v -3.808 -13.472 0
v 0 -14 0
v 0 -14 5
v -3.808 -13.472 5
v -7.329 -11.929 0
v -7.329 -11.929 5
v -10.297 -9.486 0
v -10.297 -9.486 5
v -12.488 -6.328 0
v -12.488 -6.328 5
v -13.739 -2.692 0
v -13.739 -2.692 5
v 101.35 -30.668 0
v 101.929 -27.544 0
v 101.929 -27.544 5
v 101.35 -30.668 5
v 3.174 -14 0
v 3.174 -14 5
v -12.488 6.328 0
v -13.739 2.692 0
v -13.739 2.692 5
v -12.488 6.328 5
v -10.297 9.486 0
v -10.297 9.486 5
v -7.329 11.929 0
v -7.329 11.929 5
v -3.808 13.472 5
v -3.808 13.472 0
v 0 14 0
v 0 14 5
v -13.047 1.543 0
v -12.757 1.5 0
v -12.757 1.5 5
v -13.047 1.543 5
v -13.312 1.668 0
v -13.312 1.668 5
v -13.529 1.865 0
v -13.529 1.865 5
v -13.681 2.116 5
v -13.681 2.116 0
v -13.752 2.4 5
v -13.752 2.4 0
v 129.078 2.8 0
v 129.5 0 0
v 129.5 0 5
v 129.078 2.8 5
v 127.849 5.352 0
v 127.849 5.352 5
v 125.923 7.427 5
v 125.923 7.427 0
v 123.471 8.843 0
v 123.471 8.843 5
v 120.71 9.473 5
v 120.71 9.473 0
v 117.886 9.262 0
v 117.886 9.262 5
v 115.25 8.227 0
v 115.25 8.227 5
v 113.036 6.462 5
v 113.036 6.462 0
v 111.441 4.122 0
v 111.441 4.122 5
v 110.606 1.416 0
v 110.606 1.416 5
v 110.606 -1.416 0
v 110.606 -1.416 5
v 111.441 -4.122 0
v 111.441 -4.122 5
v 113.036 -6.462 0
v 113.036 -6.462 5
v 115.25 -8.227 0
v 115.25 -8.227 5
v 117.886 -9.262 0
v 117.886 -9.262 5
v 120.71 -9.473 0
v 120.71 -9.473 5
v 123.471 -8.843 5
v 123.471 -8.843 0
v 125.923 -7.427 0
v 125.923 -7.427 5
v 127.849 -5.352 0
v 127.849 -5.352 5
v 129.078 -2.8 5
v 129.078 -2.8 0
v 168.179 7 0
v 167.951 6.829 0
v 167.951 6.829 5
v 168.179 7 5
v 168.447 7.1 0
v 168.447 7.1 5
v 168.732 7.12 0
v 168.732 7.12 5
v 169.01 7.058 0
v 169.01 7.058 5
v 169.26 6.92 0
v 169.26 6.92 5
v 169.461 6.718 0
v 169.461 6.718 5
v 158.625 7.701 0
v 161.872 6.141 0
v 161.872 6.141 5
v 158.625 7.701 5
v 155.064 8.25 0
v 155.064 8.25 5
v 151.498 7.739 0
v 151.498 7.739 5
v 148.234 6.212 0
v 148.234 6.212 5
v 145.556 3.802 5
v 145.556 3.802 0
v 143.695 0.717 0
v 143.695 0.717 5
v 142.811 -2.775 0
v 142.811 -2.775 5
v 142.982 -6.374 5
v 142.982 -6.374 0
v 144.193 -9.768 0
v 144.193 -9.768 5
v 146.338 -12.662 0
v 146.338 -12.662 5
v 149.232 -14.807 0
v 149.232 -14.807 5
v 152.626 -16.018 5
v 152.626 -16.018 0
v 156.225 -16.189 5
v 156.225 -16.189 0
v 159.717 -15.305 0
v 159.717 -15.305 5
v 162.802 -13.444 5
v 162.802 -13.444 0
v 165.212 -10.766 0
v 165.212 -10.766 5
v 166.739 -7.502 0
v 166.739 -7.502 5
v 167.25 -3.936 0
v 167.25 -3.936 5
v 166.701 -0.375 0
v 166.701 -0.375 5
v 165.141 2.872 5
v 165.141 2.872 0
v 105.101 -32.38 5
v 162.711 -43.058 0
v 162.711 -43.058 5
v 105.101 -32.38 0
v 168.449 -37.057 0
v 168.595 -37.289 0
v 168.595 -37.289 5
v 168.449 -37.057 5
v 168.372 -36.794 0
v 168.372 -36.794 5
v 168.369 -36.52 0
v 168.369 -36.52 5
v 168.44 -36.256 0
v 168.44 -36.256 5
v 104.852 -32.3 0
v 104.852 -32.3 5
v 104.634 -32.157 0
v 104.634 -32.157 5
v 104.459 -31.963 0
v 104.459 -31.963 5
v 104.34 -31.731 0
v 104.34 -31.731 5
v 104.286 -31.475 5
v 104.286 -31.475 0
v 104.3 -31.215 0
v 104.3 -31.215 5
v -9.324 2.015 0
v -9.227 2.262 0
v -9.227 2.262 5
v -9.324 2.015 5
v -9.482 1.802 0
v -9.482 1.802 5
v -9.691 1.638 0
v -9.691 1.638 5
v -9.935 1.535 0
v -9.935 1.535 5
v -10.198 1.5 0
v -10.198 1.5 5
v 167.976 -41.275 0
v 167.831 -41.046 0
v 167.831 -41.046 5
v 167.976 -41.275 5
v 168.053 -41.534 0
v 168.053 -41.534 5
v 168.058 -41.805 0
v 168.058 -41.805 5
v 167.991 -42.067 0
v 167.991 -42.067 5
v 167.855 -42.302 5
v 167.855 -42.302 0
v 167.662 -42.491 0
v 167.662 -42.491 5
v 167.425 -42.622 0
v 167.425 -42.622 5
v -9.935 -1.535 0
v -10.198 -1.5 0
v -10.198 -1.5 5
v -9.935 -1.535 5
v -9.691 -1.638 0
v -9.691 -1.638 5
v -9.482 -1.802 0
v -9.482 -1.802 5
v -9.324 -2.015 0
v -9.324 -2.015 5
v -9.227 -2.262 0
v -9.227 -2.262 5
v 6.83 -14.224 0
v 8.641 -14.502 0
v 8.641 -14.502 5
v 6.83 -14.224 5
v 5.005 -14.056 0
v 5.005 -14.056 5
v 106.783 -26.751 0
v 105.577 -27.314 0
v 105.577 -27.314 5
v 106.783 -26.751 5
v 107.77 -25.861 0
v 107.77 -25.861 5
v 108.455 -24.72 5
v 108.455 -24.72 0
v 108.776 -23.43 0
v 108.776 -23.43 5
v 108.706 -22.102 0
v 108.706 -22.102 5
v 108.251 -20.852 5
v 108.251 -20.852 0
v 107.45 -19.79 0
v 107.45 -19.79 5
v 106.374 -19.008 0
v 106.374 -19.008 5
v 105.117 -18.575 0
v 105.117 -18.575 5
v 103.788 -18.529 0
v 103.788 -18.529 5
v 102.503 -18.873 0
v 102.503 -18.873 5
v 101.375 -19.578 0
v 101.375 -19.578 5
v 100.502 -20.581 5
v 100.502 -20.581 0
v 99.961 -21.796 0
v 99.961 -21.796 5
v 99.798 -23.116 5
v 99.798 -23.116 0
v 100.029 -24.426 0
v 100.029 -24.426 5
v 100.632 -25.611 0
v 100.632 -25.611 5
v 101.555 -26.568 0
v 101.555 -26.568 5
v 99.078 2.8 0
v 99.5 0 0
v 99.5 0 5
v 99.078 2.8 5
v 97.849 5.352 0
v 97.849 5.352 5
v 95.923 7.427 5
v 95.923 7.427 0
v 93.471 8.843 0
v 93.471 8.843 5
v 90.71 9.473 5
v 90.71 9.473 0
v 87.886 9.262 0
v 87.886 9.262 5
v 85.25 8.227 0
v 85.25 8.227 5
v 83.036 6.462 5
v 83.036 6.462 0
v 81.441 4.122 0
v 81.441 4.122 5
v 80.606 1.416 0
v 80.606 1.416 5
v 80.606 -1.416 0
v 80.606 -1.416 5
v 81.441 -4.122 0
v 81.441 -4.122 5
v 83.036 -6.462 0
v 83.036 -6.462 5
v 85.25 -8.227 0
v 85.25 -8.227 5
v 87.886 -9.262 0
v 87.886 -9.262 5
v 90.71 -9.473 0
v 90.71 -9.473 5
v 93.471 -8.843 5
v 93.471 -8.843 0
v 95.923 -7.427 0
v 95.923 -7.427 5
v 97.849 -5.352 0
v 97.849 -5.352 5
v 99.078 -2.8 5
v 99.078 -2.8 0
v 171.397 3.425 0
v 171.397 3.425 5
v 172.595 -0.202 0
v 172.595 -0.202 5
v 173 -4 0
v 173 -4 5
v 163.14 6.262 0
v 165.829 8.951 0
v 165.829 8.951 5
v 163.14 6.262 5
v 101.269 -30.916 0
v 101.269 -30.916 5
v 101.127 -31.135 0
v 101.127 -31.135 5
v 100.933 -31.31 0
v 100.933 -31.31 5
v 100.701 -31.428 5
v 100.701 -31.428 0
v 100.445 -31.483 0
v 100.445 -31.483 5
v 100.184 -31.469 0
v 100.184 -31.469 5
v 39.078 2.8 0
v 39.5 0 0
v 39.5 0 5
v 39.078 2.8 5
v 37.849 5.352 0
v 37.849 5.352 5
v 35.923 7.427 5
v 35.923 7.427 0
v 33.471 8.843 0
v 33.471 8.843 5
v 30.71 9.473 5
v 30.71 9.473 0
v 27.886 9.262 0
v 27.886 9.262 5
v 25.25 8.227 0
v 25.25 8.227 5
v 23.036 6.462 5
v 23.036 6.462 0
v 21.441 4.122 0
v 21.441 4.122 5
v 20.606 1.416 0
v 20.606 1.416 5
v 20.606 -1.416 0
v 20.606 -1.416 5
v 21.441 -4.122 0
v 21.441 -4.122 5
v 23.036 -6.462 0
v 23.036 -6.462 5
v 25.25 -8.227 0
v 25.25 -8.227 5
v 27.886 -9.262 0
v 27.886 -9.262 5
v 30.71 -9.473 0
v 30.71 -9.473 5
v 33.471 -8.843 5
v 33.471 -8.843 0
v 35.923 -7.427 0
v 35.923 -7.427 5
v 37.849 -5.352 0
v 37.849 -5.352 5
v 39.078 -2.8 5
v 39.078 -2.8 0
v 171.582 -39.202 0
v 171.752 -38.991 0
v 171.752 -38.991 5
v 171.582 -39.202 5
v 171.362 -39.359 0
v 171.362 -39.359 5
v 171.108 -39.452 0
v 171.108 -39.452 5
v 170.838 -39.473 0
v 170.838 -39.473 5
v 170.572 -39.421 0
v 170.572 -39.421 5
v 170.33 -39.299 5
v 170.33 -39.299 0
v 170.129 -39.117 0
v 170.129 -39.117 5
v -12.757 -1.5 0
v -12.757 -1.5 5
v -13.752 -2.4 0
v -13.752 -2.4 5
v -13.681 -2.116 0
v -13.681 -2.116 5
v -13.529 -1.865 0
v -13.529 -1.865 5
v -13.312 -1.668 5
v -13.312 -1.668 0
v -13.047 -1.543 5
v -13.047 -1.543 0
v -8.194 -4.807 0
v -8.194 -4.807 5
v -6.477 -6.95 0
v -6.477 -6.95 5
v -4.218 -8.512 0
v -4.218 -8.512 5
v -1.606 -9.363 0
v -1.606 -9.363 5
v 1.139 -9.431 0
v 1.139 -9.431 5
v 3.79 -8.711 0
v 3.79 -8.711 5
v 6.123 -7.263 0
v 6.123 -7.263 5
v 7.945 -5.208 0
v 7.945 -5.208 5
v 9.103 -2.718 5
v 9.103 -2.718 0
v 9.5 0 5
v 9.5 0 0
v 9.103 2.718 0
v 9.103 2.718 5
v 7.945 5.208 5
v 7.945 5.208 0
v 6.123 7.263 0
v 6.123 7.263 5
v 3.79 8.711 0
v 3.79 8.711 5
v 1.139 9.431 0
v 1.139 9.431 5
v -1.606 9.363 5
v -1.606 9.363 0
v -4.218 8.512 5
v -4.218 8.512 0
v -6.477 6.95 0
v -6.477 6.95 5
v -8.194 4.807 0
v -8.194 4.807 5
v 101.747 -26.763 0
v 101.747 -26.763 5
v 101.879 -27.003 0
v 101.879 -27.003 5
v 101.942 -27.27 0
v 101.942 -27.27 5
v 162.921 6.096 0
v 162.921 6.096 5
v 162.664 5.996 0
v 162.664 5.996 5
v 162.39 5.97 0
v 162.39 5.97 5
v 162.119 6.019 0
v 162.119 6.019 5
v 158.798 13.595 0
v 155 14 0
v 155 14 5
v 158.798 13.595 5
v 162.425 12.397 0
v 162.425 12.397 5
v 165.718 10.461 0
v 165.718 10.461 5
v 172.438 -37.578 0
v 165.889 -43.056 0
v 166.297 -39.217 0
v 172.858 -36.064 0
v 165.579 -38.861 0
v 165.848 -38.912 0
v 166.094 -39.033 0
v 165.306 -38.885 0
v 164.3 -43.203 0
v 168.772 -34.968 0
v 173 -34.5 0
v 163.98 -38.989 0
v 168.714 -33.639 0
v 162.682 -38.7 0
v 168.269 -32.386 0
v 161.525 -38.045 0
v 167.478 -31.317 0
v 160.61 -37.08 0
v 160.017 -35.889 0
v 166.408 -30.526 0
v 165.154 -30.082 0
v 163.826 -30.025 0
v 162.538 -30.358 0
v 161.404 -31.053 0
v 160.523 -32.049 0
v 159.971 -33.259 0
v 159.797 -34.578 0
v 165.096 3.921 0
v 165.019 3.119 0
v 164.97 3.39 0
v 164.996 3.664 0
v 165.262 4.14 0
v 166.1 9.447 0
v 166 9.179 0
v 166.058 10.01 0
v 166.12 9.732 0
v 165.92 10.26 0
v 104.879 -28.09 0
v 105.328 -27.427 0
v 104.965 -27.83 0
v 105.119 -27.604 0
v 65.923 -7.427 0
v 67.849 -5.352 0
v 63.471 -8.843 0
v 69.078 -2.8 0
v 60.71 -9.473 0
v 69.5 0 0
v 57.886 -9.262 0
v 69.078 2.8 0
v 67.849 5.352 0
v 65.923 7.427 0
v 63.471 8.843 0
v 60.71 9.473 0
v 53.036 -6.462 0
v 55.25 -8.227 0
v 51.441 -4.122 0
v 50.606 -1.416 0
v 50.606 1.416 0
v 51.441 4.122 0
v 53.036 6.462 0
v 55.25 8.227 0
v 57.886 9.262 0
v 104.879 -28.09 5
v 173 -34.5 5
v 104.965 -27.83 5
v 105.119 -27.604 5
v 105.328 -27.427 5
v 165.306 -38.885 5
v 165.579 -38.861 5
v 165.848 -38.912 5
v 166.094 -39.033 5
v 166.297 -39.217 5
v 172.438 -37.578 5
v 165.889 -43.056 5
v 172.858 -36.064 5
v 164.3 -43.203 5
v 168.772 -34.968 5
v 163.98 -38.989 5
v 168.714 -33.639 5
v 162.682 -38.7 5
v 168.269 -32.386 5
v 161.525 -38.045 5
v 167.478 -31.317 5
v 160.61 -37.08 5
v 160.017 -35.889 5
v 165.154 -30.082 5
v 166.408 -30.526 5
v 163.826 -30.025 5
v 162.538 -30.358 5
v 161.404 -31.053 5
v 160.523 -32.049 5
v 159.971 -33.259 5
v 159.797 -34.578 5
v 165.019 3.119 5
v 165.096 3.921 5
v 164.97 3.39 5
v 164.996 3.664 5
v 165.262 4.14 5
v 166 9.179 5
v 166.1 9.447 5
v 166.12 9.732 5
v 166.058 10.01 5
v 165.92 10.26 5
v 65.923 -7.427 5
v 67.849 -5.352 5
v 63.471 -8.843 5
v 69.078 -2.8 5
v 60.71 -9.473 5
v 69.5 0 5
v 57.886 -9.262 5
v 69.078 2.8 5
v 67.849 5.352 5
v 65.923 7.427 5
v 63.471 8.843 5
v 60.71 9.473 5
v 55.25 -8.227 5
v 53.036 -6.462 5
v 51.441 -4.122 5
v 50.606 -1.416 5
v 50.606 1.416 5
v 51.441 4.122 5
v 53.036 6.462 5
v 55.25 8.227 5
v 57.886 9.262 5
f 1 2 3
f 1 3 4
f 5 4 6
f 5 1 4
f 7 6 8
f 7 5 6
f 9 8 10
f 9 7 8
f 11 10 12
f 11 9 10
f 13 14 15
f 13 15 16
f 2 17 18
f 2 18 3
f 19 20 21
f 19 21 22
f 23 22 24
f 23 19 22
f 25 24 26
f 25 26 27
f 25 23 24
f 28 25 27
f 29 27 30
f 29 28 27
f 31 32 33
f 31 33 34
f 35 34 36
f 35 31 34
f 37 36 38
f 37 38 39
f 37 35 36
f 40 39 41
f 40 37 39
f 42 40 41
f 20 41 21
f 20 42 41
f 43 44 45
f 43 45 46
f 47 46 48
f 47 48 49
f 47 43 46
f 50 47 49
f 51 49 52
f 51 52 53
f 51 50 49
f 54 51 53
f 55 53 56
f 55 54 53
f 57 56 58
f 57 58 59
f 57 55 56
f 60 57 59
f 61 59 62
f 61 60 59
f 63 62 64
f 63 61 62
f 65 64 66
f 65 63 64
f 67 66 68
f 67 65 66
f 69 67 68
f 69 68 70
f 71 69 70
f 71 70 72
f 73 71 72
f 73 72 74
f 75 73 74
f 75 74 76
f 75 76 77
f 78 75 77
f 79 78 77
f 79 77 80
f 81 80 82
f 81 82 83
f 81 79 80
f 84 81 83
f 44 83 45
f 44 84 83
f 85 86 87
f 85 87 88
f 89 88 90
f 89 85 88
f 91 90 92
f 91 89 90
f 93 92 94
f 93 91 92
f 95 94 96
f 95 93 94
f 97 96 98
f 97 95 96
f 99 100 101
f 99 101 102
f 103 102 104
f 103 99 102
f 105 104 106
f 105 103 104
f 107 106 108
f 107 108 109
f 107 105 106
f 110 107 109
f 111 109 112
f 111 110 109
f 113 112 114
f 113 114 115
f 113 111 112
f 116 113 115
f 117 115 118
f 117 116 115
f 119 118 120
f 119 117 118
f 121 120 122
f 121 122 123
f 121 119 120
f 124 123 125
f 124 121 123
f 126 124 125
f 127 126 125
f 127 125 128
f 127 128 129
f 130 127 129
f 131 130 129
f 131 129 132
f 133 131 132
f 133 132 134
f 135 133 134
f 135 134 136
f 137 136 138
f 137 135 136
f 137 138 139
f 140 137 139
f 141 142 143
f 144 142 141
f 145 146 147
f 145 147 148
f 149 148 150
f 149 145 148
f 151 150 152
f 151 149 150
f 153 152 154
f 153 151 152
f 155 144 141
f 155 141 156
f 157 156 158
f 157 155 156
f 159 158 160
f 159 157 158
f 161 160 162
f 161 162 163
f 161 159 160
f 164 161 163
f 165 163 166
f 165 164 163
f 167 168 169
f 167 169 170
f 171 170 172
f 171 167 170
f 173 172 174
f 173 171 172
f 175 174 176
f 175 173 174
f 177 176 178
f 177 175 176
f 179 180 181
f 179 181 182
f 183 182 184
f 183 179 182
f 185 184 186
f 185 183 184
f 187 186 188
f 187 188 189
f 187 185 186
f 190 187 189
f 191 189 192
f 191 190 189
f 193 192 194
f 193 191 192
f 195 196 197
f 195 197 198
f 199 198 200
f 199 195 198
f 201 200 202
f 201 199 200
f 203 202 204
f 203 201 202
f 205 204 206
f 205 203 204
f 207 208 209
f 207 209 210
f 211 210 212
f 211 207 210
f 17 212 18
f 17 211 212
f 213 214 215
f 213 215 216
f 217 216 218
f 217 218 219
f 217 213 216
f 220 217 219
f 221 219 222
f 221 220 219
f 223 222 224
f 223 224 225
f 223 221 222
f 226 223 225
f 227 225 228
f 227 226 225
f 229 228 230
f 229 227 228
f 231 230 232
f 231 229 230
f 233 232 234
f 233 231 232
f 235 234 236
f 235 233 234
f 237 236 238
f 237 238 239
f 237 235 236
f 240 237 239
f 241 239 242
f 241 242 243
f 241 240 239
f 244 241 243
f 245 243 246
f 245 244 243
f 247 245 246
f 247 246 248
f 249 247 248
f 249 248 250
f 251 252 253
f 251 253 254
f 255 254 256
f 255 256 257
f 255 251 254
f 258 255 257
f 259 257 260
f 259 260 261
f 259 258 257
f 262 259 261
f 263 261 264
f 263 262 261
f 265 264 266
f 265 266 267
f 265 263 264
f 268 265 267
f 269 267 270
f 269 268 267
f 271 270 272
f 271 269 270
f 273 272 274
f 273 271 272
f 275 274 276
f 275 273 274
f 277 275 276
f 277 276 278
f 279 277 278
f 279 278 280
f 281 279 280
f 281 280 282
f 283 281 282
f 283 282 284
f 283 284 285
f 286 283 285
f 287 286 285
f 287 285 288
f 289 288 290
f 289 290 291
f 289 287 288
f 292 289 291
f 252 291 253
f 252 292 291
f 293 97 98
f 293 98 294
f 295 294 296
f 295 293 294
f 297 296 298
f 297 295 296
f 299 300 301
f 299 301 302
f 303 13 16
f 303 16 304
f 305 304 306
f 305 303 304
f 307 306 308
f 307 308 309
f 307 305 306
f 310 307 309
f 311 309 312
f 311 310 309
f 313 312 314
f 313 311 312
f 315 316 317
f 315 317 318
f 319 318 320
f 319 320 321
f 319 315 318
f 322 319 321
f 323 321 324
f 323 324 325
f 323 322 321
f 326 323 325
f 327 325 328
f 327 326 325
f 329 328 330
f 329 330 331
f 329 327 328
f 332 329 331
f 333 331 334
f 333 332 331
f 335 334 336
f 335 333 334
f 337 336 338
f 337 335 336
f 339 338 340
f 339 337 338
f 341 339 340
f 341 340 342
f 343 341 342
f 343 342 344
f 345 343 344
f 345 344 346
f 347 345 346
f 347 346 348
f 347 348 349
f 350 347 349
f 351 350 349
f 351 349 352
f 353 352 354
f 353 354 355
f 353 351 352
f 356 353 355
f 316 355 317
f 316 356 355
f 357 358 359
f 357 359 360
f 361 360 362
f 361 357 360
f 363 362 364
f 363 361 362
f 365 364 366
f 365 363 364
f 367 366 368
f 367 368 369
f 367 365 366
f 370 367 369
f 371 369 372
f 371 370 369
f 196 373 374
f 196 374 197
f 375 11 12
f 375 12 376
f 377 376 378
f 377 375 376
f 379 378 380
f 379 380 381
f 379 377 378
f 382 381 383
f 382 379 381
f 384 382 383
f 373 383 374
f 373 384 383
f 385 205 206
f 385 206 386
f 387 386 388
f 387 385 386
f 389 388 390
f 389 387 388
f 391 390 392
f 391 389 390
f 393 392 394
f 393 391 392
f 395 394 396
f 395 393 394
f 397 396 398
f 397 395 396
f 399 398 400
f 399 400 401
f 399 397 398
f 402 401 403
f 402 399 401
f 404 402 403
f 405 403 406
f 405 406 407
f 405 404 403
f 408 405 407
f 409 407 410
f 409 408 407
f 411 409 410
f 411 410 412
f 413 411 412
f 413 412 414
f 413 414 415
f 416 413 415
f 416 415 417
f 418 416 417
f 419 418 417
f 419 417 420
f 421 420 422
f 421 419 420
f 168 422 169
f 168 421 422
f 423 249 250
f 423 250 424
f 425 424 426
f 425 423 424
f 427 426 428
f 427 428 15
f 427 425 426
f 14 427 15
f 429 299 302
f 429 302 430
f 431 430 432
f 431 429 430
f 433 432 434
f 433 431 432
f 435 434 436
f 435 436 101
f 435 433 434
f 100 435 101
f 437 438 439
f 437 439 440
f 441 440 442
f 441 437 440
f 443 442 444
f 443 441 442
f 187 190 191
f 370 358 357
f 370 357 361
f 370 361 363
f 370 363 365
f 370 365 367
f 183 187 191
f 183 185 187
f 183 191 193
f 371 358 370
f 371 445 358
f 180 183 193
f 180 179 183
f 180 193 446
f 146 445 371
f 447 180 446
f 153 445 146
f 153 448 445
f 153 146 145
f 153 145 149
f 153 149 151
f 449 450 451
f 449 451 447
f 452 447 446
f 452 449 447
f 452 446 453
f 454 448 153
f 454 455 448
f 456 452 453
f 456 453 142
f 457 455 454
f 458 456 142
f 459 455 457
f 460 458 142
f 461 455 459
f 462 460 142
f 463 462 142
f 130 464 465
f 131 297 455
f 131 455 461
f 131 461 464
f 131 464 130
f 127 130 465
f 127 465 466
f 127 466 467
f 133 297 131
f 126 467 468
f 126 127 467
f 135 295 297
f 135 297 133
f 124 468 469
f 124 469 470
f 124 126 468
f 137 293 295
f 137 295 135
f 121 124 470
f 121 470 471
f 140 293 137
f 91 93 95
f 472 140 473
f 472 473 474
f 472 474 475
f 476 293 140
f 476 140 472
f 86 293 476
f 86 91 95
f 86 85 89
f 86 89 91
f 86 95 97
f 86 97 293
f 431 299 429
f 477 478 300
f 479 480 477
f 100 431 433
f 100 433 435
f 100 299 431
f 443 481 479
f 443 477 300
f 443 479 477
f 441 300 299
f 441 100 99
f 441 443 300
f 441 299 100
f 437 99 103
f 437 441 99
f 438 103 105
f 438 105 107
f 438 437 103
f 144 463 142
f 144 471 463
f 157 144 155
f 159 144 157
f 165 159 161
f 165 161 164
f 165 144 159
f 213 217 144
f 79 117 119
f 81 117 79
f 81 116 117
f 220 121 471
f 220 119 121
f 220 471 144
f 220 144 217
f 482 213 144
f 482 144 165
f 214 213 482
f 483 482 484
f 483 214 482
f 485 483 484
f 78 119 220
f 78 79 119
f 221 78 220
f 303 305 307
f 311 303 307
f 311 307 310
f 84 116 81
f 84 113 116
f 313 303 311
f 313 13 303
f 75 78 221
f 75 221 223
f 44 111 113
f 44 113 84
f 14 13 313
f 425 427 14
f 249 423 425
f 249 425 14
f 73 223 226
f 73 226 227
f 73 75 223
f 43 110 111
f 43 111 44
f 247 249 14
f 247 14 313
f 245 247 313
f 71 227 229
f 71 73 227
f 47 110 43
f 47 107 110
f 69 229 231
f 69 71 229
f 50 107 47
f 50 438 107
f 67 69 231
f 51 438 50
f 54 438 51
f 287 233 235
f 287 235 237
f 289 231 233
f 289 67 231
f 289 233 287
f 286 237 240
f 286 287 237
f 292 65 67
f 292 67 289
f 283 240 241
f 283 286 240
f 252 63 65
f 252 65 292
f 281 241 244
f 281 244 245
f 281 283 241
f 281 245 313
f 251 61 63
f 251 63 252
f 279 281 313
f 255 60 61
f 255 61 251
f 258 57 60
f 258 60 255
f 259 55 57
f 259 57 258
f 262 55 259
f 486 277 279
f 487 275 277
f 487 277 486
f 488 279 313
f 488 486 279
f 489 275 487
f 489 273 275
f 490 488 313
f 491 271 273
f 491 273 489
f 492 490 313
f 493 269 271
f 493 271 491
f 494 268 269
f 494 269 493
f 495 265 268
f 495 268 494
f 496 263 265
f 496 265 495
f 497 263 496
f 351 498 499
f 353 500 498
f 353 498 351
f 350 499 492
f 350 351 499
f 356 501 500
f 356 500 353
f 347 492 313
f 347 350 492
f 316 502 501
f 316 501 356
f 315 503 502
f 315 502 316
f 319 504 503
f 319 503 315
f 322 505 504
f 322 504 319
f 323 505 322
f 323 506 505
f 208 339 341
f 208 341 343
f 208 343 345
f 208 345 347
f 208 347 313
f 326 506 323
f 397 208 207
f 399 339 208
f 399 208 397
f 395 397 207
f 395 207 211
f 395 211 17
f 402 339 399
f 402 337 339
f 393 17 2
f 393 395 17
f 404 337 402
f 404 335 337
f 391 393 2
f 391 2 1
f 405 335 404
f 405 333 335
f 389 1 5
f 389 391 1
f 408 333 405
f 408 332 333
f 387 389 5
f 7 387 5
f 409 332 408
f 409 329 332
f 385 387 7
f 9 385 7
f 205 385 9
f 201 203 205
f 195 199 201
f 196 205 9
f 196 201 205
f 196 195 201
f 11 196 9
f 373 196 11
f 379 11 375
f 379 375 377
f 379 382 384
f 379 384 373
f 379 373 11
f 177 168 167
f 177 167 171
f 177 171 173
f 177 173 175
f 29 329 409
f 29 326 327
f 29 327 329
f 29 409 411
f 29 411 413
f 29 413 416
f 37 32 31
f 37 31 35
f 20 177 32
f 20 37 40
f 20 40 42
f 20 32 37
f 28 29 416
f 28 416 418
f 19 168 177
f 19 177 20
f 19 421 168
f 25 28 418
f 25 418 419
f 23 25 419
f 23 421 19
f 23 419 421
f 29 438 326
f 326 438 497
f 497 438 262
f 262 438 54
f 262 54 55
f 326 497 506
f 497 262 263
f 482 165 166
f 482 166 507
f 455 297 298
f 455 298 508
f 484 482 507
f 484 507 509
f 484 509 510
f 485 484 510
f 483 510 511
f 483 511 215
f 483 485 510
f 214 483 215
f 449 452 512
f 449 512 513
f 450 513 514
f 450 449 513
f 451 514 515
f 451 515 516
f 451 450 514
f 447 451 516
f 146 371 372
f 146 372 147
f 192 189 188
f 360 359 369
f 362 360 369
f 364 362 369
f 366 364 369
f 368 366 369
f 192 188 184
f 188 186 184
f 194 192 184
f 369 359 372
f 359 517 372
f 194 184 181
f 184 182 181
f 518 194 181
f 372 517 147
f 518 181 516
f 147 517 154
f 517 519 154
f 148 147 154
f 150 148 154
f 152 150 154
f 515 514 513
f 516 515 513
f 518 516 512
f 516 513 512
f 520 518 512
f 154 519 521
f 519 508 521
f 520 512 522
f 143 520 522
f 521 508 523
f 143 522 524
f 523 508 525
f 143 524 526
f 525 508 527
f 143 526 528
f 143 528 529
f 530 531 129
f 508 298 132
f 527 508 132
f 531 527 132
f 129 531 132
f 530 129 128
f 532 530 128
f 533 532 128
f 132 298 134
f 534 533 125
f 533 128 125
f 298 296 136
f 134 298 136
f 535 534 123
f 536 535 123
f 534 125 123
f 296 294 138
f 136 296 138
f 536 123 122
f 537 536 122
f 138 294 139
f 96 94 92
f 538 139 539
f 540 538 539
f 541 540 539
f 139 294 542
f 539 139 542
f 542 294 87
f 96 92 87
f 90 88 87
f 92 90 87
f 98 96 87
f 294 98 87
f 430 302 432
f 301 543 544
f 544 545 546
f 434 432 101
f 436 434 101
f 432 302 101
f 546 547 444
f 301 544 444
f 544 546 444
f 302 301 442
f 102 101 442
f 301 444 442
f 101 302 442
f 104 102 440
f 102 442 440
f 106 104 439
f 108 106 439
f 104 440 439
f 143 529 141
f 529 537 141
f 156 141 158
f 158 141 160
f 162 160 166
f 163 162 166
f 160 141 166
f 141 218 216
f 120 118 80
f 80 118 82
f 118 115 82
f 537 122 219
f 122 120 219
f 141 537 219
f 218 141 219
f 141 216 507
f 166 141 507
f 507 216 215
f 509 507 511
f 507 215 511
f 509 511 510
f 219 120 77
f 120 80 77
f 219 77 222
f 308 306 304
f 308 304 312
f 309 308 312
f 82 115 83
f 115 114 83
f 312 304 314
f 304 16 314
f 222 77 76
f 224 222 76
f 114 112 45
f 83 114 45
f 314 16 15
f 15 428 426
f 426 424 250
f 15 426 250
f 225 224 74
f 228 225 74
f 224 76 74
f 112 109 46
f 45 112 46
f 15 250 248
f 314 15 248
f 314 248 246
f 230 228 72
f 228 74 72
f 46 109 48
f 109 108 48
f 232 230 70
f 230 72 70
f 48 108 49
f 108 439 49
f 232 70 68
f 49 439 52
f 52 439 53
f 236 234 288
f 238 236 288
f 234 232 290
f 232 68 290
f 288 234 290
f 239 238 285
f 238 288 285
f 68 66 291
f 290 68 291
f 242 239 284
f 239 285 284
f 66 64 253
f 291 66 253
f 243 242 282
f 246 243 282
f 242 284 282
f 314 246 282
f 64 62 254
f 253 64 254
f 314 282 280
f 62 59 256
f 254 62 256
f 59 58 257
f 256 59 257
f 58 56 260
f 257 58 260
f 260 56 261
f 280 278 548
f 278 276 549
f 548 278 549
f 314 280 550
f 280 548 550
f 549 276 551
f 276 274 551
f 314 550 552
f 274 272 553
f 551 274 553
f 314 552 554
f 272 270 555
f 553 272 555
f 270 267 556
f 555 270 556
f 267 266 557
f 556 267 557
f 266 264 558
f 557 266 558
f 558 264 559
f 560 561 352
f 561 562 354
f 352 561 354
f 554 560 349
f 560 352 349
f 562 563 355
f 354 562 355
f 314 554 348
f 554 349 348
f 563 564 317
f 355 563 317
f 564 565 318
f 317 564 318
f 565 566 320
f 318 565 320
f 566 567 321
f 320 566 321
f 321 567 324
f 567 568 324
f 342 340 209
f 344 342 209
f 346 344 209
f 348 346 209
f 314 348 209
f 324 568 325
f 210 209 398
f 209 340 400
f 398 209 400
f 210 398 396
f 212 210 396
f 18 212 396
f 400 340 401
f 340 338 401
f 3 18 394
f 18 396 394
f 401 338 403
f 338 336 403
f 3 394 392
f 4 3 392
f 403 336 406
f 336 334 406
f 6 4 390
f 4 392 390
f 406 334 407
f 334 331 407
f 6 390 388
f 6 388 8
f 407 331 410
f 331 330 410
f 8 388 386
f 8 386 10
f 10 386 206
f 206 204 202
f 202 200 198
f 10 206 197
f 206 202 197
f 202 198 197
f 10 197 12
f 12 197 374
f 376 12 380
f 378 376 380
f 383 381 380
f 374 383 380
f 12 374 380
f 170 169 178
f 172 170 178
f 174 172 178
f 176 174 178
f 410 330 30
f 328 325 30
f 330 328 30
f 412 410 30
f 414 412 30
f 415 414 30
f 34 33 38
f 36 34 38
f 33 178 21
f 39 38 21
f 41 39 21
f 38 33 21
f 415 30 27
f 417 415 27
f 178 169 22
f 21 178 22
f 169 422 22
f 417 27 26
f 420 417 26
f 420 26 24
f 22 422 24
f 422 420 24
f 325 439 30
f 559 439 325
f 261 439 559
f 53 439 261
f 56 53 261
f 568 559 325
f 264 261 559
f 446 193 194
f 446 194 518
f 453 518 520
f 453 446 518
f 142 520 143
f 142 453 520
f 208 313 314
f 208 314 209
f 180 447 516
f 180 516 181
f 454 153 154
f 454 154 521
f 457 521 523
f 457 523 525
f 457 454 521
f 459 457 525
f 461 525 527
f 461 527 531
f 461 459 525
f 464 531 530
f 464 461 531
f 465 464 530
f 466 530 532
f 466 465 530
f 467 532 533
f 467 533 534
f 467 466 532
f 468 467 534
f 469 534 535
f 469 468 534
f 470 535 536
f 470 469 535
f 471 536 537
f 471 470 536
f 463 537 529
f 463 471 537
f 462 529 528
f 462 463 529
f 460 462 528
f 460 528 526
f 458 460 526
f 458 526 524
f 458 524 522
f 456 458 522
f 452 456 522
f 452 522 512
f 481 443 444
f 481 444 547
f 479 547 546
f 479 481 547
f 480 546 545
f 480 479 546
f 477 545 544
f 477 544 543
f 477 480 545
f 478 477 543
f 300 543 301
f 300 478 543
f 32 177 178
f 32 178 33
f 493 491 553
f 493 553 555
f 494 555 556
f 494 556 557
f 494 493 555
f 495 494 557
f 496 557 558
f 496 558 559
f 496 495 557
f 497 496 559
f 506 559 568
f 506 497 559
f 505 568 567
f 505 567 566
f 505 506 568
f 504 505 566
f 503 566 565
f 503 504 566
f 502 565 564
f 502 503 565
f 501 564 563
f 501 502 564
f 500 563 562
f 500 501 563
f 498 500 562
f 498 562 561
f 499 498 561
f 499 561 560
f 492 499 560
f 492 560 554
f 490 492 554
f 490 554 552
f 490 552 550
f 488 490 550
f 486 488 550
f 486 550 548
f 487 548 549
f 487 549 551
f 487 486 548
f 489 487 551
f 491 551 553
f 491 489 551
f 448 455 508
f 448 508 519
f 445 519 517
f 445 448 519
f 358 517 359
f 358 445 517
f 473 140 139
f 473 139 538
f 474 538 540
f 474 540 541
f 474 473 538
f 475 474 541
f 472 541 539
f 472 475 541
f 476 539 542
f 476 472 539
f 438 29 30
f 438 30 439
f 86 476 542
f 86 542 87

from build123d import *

# Parameters (mm, degrees)
SKETCH1_R      = 9.5
EXTRUDE1_DEPTH = 5


with BuildPart() as part:
    # Sketch1 → Extrude1 (new body)
    with BuildSketch(Plane.XY):
        with BuildLine():
            Line((0, 14), (155, 14))
            ThreePointArc((155, 14), (160.643434486, 13.092444155), (165.717787645, 10.461294133))
            ThreePointArc((165.717787645, 10.461294133), (166.119633231, 9.731618991), (165.829461779, 8.950782122))
            Line((165.829461779, 8.950782122), (163.140222938, 6.261543282))
            ThreePointArc((163.140222938, 6.261543282), (162.527882268, 5.973150498), (161.872126258, 6.140827417))
            ThreePointArc((161.872126258, 6.140827417), (146.33794193, -12.66205807), (165.140827417, 2.872126258))
            ThreePointArc((165.140827417, 2.872126258), (164.973150498, 3.527882268), (165.261543282, 4.140222938))
            Line((165.261543282, 4.140222938), (167.950782122, 6.829461779))
            ThreePointArc((167.950782122, 6.829461779), (168.731618991, 7.119633231), (169.461294133, 6.717787645))
            ThreePointArc((169.461294133, 6.717787645), (172.092444155, 1.643434486), (173, -4))
            Line((173, -4), (173, -34.5))
            ThreePointArc((173, -34.5), (172.682195303, -36.830428123), (171.751990775, -38.990662972))
            ThreePointArc((171.751990775, -38.990662972), (170.973301155, -39.471650118), (170.129341386, -39.117477748))
            Line((170.129341386, -39.117477748), (168.594776555, -37.288654597))
            ThreePointArc((168.594776555, -37.288654597), (168.37185122, -36.79398444), (168.440072921, -36.255709354))
            ThreePointArc((168.440072921, -36.255709354), (161.404162333, -31.052800006), (165.306254745, -38.88529503))
            ThreePointArc((165.306254745, -38.88529503), (165.848198797, -38.911580258), (166.296643225, -39.217017426))
            Line((166.296643225, -39.217017426), (167.831208056, -41.045840577))
            ThreePointArc((167.831208056, -41.045840577), (168.033447677, -41.938480088), (167.424549772, -42.621817122))
            ThreePointArc((167.424549772, -42.621817122), (165.097799098, -43.166346819), (162.710657326, -43.057555971))
            Line((162.710657326, -43.057555971), (105.10076609, -32.38019375))
            ThreePointArc((105.10076609, -32.38019375), (104.458875427, -31.96334508), (104.299746708, -31.214703317))
            Line((104.299746708, -31.214703317), (104.878820837, -28.090298909))
            ThreePointArc((104.878820837, -28.090298909), (105.118722541, -27.603635328), (105.577463168, -27.31389181))
            ThreePointArc((105.577463168, -27.31389181), (105.116766441, -18.575352916), (101.555056728, -26.568382843))
            ThreePointArc((101.555056728, -26.568382843), (101.879493209, -27.003279657), (101.929056114, -27.543592333))
            Line((101.929056114, -27.543592333), (101.349981985, -30.667996741))
            ThreePointArc((101.349981985, -30.667996741), (100.933133315, -31.309887404), (100.184491552, -31.469016123))
            Line((100.184491552, -31.469016123), (8.640568057, -14.502352773))
            ThreePointArc((8.640568057, -14.502352773), (5.918550852, -14.125852173), (3.173502293, -14))
            Line((3.173502293, -14), (0, -14))
            ThreePointArc((0, -14), (-8.89684473, -10.809539946), (-13.738685501, -2.692307692))
            ThreePointArc((-13.738685501, -2.692307692), (-13.529460818, -1.864511091), (-12.757350822, -1.5))
            Line((-12.757350822, -1.5), (-10.198039027, -1.5))
            ThreePointArc((-10.198039027, -1.5), (-9.580825627, -1.713204208), (-9.226797215, -2.261904762))
            ThreePointArc((-9.226797215, -2.261904762), (9.5, 0), (-9.226797215, 2.261904762))
            ThreePointArc((-9.226797215, 2.261904762), (-9.580825627, 1.713204208), (-10.198039027, 1.5))
            Line((-10.198039027, 1.5), (-12.757350822, 1.5))
            ThreePointArc((-12.757350822, 1.5), (-13.529460818, 1.864511091), (-13.738685501, 2.692307692))
            ThreePointArc((-13.738685501, 2.692307692), (-8.89684473, 10.809539946), (0, 14))
        make_face()
        with Locations((30, 0)):
            Circle(SKETCH1_R, mode=Mode.SUBTRACT)
        with Locations((60, 0)):
            Circle(SKETCH1_R, mode=Mode.SUBTRACT)
        with Locations((90, 0)):
            Circle(SKETCH1_R, mode=Mode.SUBTRACT)
        with Locations((120, 0)):
            Circle(SKETCH1_R, mode=Mode.SUBTRACT)
    extrude(amount=EXTRUDE1_DEPTH)


solid = part.part
